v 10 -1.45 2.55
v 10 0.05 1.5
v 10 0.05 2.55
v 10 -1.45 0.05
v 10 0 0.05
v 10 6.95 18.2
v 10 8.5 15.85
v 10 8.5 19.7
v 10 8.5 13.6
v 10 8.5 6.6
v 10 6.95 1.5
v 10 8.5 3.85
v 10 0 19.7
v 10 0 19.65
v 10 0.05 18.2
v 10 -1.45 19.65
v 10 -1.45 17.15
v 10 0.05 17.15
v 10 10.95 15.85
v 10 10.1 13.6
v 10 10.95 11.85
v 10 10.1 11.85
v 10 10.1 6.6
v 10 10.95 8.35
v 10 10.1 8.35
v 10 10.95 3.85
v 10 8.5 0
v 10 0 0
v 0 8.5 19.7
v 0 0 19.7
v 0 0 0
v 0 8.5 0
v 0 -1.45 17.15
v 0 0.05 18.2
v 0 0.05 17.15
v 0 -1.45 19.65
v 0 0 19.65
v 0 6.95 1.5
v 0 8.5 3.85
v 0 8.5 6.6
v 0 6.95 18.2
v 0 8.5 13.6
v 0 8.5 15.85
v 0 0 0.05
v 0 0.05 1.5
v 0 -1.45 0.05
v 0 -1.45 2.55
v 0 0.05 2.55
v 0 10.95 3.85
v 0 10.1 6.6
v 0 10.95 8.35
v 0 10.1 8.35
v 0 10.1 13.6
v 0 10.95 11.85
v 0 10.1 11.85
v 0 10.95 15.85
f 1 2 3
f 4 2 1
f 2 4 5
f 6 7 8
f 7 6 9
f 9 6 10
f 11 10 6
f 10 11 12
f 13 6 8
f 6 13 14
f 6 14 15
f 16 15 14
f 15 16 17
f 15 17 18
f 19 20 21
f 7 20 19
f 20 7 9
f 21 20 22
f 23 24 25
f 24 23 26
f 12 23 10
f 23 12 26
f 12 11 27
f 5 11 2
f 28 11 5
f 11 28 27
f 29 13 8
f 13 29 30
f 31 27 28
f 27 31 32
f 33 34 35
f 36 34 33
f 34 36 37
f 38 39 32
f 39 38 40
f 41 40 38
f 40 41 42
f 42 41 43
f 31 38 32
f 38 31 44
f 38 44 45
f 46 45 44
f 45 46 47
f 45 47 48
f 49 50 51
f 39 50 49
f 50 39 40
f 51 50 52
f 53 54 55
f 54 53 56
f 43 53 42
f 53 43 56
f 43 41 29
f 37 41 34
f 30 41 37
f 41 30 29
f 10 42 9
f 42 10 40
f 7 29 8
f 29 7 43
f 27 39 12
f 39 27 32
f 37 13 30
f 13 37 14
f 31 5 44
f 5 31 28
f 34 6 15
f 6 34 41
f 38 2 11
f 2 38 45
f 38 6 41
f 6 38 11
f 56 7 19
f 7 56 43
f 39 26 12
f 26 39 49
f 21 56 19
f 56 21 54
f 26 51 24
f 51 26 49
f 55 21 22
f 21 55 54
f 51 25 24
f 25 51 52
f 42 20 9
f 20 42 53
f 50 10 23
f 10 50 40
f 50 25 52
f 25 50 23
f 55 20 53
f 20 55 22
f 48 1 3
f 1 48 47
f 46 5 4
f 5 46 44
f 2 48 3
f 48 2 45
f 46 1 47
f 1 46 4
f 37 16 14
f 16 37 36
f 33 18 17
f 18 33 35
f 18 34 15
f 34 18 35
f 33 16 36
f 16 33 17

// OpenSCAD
profile_width = 16.7; // [10:0.1:50]
profile_height = 7; // [1:0.1:30]
mount_distance = 2.5; // [2.5:0.1:15]
clip_size = 10; // [5:0.5:30]
arm = 1; // [0.5:0.1:3]

module test()
{
}


profile_h=profile_width;
profile_d=profile_height;;

holder_l=clip_size;;
holder_d=4;
wall=1.5;
delta=0.05;

screwh=8;
screwh2=4.5;
screwd=1.6;
screwholderw=12;
screwholderd=mount_distance;
swall=1;

difference()
{
  cube([holder_l,profile_d+wall,profile_h+wall*2]);
  translate([-delta,-delta,wall]) cube([holder_l+2*delta,profile_d,profile_h]);
}
translate([0,-wall+delta,delta]) cube([holder_l,wall,wall+arm]);
translate([0,-wall+delta,profile_h-delta-arm+wall]) cube([holder_l,wall,wall+arm]);


difference()
{
    translate([0,profile_d+wall-delta,(profile_h+2*wall-screwholderw)/2]) cube([holder_l,screwholderd,screwholderw]);
    translate([-delta,profile_d+wall-swall+screwholderd+delta,(profile_h+3*wall-screwh2)/2]) cube([holder_l+2*delta, swall, screwh2-swall]);
    translate([-delta,profile_d+screwholderd+wall-screwd-swall+2*delta,(profile_h+3*wall-screwh)/2]) cube([holder_l+2*delta, screwd, screwh-swall]);
}
